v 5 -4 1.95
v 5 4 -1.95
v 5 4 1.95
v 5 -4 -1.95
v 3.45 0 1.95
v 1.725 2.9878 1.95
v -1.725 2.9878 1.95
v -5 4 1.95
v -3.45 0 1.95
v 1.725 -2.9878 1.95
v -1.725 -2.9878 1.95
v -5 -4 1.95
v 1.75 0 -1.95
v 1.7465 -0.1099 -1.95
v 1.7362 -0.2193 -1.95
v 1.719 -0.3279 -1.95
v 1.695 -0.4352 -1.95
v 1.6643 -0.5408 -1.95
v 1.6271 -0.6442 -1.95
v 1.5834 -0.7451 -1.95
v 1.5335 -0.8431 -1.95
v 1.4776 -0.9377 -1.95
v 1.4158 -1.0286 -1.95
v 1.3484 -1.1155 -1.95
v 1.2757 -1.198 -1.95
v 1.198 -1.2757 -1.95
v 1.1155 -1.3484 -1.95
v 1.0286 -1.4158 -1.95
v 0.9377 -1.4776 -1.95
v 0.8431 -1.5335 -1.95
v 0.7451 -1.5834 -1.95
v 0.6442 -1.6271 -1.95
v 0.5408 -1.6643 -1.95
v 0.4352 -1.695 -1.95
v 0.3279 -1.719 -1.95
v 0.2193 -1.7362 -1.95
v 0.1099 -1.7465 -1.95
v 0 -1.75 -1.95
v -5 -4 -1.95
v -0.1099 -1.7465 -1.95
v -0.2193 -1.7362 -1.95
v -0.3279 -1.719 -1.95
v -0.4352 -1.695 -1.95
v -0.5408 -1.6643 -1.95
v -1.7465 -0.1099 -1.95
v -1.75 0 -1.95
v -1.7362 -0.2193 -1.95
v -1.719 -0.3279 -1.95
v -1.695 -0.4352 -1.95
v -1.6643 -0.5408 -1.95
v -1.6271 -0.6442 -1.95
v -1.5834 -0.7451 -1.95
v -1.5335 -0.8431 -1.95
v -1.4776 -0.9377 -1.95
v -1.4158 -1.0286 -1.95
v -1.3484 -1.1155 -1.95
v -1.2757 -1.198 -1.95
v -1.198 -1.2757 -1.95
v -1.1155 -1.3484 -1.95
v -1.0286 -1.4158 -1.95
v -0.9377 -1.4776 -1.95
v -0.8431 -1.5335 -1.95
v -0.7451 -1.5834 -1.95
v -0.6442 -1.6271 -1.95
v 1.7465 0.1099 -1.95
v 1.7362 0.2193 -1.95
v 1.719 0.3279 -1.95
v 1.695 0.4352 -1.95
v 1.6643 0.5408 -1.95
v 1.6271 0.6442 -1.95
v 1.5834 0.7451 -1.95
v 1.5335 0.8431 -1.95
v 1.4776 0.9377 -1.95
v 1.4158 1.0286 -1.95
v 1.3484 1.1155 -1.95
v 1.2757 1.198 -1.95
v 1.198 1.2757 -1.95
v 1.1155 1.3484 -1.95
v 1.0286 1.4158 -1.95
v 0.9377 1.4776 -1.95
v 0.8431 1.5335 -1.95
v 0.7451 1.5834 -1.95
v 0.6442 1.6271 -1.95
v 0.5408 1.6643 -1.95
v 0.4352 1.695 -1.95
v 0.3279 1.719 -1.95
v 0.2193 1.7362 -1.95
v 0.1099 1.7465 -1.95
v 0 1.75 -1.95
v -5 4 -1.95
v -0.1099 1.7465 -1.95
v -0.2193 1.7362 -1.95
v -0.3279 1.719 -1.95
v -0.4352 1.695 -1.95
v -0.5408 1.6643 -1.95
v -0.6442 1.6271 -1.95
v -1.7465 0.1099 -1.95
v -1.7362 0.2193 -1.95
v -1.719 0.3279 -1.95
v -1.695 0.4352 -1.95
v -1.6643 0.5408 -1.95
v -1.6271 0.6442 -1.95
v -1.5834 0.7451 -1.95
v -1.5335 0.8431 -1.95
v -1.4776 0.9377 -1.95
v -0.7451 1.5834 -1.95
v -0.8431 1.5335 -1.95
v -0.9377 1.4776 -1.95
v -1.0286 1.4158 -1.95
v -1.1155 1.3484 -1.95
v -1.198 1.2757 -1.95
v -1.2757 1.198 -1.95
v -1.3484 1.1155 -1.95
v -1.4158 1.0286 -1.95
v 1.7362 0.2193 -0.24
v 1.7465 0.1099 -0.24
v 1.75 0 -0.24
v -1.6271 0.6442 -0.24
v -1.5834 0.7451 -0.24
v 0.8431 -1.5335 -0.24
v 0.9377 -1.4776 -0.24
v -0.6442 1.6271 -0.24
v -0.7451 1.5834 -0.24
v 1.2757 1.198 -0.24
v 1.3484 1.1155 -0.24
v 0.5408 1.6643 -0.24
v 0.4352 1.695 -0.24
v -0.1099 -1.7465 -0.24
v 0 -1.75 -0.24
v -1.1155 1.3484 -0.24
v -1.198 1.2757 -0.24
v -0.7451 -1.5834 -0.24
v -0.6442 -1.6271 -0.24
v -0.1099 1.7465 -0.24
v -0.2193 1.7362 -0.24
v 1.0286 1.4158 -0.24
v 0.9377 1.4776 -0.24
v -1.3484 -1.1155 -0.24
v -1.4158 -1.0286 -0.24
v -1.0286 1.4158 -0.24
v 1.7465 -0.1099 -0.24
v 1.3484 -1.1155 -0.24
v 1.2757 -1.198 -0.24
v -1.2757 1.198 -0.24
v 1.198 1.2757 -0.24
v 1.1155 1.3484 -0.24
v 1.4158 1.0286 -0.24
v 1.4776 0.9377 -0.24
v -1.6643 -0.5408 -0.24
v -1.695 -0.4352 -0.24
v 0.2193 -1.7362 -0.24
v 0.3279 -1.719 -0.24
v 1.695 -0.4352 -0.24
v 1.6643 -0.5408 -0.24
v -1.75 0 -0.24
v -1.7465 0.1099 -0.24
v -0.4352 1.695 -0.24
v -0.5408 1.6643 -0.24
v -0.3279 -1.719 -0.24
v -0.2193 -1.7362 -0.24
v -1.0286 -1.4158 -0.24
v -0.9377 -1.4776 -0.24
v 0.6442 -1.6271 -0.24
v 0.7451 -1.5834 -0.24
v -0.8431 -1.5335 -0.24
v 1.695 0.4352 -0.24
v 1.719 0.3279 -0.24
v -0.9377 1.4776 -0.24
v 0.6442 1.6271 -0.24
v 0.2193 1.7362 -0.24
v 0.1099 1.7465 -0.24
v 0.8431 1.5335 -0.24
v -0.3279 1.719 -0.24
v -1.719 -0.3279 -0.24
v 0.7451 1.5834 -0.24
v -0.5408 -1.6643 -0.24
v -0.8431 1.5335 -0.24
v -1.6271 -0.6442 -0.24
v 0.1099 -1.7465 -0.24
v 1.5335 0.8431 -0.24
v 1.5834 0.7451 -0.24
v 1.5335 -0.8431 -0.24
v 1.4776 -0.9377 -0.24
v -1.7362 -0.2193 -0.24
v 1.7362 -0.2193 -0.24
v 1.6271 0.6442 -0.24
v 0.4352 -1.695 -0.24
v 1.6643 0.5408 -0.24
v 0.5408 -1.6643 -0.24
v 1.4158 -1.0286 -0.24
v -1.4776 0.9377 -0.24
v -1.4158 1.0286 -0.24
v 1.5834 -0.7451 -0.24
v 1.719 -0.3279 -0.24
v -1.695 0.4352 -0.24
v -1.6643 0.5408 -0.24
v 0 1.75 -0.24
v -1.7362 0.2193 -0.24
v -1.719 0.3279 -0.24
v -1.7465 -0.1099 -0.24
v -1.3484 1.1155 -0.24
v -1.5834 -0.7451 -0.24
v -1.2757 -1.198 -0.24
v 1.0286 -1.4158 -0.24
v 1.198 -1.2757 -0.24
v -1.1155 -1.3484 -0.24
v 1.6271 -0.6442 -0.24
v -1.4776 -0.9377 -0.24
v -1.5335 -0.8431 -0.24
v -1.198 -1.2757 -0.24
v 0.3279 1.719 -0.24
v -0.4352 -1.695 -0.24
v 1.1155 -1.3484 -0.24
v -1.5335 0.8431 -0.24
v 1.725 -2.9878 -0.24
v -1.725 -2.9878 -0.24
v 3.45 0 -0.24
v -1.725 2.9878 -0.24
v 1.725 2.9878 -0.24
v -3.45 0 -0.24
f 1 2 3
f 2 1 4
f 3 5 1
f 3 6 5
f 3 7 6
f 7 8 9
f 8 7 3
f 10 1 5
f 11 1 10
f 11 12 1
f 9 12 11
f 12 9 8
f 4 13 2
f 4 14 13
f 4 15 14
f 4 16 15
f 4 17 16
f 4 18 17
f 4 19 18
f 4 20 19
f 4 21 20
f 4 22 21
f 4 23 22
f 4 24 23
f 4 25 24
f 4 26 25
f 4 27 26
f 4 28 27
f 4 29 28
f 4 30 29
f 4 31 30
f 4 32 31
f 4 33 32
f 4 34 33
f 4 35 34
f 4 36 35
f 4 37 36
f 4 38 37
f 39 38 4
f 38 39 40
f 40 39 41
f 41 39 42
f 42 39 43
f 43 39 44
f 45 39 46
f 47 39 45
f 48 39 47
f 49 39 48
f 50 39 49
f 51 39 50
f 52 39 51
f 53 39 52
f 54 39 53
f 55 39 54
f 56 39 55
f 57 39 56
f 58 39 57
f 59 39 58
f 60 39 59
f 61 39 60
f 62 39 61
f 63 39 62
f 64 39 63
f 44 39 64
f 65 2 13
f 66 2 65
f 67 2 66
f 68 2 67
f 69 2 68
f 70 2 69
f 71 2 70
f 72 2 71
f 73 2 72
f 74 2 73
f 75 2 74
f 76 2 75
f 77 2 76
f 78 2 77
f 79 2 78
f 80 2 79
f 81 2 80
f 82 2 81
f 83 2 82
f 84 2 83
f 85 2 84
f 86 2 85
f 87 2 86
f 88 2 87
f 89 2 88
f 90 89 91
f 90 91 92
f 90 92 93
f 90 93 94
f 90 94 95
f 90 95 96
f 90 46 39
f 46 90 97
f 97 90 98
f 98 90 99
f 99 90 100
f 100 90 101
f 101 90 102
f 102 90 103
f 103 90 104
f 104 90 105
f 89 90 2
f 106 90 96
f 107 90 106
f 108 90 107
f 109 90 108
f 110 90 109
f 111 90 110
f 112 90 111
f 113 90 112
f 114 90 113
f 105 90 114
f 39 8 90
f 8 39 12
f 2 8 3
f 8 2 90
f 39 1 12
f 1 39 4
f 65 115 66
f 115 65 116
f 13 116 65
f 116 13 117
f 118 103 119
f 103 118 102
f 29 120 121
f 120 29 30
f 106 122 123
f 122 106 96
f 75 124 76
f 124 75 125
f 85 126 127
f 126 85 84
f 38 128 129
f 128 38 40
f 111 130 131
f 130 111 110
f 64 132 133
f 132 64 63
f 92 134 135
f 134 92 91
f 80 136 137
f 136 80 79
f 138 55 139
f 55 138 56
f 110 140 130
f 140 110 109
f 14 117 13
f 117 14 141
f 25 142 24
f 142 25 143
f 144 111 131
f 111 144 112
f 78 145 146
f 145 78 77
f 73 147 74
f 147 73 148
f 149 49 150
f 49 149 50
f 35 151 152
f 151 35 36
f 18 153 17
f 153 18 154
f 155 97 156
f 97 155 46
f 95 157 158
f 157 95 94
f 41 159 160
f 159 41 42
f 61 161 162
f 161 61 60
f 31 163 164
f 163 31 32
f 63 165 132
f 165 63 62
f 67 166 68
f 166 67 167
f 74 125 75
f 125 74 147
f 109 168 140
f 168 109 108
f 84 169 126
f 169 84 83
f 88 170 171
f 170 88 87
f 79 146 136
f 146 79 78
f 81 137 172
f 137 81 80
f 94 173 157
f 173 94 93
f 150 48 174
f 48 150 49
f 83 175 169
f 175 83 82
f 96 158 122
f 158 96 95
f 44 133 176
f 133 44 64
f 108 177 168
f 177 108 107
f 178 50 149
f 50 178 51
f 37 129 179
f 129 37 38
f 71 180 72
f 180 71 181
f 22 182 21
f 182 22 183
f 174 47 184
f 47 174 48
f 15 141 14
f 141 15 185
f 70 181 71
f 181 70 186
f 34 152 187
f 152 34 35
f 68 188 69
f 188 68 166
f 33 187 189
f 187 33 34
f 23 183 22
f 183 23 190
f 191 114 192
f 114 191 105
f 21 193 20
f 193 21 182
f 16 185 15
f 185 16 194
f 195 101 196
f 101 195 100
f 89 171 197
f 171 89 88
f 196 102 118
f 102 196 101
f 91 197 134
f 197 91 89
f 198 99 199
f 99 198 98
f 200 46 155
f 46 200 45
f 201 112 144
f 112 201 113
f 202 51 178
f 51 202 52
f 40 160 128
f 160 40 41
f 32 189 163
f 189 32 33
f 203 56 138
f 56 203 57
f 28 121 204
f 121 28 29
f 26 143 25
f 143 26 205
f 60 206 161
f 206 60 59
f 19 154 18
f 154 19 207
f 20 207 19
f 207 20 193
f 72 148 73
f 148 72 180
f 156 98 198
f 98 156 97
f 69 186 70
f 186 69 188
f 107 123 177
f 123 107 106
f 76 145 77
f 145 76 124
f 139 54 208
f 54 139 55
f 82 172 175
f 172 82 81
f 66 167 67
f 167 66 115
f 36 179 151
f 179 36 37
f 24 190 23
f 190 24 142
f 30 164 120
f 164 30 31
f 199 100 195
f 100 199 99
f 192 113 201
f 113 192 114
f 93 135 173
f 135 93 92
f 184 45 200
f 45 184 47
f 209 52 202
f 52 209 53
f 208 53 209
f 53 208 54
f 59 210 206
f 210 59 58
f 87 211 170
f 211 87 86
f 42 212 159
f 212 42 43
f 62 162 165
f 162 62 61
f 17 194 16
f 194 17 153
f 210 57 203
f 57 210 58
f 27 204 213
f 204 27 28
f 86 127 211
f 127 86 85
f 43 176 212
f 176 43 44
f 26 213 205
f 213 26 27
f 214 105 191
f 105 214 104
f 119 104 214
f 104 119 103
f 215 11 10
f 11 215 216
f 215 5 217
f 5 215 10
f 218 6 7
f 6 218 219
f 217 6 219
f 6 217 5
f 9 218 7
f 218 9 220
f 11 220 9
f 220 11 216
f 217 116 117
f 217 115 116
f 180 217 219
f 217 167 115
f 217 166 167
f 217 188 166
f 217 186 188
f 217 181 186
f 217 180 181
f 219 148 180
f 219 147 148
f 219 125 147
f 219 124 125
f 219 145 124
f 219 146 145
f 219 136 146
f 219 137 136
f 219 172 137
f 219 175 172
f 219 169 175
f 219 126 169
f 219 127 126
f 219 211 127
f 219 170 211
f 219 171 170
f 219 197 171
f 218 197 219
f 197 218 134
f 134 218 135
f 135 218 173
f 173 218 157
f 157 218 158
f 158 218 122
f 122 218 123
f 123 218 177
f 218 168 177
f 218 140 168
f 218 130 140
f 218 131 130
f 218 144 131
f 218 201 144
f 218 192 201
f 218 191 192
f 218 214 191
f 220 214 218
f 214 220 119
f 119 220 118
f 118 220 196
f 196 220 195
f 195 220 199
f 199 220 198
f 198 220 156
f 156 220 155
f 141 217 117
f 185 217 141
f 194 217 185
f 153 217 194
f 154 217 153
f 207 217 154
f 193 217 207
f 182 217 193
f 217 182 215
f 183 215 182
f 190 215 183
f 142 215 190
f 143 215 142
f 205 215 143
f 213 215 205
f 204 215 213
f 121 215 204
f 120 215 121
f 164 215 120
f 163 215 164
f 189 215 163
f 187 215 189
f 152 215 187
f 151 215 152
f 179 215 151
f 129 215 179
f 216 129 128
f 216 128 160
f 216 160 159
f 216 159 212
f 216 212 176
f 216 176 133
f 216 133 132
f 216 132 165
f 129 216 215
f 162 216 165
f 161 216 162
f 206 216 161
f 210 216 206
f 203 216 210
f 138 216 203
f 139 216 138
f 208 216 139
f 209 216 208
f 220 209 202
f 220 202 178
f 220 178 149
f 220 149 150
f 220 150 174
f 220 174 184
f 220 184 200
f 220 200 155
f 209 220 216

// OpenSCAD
$fn = 100;

// There are two kinds of 2020 extrusion, t-slot (which is most of what I could find on Thingiverse)
// and a type with a narrower slot, which can be identified by having 4mm holes in the corners of the
// extrusion. This nut is designed to fit that type of extrusion.

nut();

module nut(length=10, width=8, height=3.9, hole_diameter=3.5, nut_diameter=6.9, nut_depth=2.2) {
    difference() {
        // Create the main body of the nut
        union() {
            // Main rectangular body
            cube([length, width, height], center=true);
            // Flange on the bottom
            // translate([0, 0, -height/2 - 1.0/2])
            //     cube([length, 5, 1.0], center=true);
        }
        
        // Create the hole through the nut
        translate([0, 0, -1]) // Extend the hole slightly below the nut
            cylinder(h=height + 2, d=hole_diameter, center=true);
        
        // Create a hexagon cutout on the top of the nut
        translate([0, 0, height/2 - nut_depth/2 + 0.01])
            cylinder(h=nut_depth, d=nut_diameter, center=true, $fn=6);
    }
}
